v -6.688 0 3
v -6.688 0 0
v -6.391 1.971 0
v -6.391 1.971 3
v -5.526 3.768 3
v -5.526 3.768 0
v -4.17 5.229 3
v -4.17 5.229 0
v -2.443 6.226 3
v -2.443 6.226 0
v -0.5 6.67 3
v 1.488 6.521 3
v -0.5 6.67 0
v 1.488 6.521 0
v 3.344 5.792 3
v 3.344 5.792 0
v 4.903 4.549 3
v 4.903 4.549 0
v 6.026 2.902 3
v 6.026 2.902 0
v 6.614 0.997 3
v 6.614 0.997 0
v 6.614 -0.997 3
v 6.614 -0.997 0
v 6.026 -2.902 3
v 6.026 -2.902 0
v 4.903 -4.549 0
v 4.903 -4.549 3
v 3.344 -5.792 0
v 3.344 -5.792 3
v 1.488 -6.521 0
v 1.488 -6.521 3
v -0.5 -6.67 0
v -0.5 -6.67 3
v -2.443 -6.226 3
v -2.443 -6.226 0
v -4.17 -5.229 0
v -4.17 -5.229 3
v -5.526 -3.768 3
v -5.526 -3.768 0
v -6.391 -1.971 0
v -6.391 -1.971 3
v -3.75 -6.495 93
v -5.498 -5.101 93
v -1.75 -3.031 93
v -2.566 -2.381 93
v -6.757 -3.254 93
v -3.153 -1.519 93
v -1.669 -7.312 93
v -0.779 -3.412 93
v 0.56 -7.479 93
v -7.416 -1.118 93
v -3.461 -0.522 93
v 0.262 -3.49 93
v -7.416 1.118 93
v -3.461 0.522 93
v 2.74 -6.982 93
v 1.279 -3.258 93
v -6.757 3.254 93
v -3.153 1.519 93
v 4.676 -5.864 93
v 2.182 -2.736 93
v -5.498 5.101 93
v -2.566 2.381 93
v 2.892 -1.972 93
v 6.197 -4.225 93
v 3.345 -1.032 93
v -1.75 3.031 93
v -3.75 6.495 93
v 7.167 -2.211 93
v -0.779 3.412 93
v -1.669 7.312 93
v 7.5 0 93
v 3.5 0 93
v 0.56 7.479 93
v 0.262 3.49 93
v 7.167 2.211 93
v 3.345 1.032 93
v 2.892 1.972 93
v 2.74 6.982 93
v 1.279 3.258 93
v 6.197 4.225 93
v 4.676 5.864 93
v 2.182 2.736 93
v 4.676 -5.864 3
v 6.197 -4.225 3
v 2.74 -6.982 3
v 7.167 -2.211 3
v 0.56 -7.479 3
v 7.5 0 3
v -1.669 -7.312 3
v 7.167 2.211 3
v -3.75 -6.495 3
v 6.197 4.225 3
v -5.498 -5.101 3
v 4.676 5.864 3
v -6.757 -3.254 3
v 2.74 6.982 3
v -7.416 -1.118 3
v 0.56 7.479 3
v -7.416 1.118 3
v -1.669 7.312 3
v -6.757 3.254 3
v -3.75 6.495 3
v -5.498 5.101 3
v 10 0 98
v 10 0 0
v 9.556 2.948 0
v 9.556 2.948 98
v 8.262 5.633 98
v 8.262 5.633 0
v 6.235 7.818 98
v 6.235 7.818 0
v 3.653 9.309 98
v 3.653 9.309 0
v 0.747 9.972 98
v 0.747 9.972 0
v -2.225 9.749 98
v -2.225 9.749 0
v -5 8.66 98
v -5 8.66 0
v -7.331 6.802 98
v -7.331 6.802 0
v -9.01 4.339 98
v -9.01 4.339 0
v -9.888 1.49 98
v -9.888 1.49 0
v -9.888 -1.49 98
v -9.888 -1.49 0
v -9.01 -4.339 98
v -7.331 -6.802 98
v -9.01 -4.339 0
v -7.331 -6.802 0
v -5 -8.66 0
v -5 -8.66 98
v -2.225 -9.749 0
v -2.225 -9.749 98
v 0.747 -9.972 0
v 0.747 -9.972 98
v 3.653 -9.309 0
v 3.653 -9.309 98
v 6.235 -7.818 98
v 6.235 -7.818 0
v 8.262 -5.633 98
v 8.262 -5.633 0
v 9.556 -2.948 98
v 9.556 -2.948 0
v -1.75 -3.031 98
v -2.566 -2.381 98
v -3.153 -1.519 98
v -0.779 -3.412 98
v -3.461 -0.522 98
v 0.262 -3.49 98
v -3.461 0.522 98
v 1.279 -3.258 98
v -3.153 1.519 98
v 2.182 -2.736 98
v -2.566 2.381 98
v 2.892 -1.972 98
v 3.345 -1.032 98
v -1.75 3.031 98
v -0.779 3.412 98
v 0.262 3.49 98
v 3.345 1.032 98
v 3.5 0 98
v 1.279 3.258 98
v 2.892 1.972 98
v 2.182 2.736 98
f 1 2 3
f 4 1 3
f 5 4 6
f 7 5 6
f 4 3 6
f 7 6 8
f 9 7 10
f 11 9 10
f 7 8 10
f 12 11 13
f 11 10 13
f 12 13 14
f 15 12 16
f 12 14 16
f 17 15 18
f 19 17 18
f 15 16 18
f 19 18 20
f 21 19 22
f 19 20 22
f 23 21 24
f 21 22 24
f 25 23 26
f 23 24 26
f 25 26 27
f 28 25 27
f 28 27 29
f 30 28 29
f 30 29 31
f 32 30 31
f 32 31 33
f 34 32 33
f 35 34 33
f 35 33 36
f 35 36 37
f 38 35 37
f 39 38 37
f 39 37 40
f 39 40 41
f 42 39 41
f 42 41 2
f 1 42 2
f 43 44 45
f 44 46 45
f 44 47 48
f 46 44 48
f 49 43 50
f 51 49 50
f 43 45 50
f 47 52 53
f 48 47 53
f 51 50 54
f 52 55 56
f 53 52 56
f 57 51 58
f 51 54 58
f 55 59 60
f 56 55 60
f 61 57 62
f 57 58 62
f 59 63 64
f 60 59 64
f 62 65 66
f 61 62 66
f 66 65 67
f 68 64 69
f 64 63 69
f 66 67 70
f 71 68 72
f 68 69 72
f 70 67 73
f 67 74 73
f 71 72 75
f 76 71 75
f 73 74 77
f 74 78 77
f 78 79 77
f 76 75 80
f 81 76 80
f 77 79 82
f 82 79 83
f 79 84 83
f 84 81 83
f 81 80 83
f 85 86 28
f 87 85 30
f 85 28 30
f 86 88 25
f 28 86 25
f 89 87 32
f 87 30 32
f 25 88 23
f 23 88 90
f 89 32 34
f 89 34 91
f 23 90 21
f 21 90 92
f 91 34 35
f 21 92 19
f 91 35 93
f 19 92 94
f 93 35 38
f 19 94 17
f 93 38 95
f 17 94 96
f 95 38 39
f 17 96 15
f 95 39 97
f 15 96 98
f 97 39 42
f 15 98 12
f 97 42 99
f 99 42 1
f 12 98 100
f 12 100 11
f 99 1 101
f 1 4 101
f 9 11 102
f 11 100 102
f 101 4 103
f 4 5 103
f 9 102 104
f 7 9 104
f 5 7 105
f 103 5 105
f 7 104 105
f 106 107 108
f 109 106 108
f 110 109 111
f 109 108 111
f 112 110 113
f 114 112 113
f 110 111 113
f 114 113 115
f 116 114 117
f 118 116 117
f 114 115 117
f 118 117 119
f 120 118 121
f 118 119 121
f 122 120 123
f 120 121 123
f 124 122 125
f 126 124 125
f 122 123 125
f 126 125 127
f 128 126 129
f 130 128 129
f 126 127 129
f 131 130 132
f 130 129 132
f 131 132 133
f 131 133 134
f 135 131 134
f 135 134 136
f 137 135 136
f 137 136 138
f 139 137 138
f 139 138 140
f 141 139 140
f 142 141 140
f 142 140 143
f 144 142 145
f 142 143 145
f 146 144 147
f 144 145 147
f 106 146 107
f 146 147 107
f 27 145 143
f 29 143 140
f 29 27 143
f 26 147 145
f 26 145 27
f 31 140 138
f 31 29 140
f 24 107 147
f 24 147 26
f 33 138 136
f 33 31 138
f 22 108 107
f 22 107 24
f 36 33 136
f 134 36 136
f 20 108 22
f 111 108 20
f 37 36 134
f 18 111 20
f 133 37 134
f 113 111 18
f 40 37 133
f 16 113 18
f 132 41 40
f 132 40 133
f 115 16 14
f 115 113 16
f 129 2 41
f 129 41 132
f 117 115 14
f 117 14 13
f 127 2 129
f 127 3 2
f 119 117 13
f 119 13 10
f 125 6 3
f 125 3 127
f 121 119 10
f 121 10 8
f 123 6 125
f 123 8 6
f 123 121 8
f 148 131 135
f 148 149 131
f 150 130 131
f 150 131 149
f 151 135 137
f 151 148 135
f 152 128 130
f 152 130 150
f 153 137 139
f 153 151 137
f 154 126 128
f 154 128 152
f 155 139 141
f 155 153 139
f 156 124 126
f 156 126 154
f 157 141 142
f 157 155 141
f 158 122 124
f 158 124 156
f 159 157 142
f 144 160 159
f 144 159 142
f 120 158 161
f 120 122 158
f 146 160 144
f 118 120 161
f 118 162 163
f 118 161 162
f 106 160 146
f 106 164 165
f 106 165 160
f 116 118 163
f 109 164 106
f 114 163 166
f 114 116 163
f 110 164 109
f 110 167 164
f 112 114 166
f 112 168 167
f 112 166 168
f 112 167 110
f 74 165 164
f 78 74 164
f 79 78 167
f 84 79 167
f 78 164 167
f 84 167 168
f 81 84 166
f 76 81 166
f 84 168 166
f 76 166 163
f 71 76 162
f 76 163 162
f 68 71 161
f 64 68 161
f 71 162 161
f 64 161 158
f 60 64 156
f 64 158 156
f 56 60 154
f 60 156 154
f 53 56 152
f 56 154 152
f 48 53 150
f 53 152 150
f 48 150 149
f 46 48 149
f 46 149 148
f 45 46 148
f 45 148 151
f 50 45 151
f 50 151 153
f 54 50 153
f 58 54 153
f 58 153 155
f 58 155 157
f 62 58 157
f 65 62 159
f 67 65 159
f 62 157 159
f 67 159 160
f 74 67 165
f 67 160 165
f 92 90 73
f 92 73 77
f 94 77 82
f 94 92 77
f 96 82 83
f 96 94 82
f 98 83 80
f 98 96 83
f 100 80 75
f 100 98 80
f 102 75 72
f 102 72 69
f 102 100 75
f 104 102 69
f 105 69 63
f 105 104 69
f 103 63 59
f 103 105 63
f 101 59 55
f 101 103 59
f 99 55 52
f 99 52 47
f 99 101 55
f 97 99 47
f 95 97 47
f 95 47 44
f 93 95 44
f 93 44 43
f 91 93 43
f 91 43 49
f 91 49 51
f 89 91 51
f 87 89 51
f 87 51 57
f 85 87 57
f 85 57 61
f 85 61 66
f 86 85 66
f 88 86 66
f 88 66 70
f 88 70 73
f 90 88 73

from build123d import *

# Parameters (mm, degrees)
SKETCH1_R           = 10
SKETCH1_R_2         = 7.5
BOSS_EXTRUDE1_DEPTH = 98
SKETCH2_R           = 7.5
BOSS_EXTRUDE2_DEPTH = 5
SKETCH3_R           = 3.5
CUT_EXTRUDE1_DEPTH  = 5
SKETCH4_R           = 7.5
BOSS_EXTRUDE4_DEPTH = 3
SKETCH5_R           = 6.688248189
CUT_EXTRUDE2_DEPTH  = 5


with BuildPart() as part:
    # Sketch1 → Boss-Extrude1 (new body)
    with BuildSketch(Plane.XY):
        Circle(SKETCH1_R)
        Circle(SKETCH1_R_2, mode=Mode.SUBTRACT)
    extrude(amount=BOSS_EXTRUDE1_DEPTH)

    # Sketch2 → Boss-Extrude2 (add)
    with BuildSketch(Plane.XY.offset(98)):
        Circle(SKETCH2_R)
    extrude(amount=-BOSS_EXTRUDE2_DEPTH)

    # Sketch3 → Cut-Extrude1 (cut)
    with BuildSketch(Plane.XY.offset(98)):
        Circle(SKETCH3_R)
    extrude(amount=-CUT_EXTRUDE1_DEPTH, mode=Mode.SUBTRACT)

    # Sketch4 → Boss-Extrude4 (add)
    with BuildSketch(Plane(origin=(0, 0, 0), x_dir=(-1, 0, 0), z_dir=(0, 0, -1))):
        Circle(SKETCH4_R)
    extrude(amount=-BOSS_EXTRUDE4_DEPTH)

    # Sketch5 → Cut-Extrude2 (cut)
    with BuildSketch(Plane(origin=(0, 0, 0), x_dir=(-1, 0, 0), z_dir=(0, 0, -1))):
        Circle(SKETCH5_R)
    extrude(amount=-CUT_EXTRUDE2_DEPTH, mode=Mode.SUBTRACT)


solid = part.part
